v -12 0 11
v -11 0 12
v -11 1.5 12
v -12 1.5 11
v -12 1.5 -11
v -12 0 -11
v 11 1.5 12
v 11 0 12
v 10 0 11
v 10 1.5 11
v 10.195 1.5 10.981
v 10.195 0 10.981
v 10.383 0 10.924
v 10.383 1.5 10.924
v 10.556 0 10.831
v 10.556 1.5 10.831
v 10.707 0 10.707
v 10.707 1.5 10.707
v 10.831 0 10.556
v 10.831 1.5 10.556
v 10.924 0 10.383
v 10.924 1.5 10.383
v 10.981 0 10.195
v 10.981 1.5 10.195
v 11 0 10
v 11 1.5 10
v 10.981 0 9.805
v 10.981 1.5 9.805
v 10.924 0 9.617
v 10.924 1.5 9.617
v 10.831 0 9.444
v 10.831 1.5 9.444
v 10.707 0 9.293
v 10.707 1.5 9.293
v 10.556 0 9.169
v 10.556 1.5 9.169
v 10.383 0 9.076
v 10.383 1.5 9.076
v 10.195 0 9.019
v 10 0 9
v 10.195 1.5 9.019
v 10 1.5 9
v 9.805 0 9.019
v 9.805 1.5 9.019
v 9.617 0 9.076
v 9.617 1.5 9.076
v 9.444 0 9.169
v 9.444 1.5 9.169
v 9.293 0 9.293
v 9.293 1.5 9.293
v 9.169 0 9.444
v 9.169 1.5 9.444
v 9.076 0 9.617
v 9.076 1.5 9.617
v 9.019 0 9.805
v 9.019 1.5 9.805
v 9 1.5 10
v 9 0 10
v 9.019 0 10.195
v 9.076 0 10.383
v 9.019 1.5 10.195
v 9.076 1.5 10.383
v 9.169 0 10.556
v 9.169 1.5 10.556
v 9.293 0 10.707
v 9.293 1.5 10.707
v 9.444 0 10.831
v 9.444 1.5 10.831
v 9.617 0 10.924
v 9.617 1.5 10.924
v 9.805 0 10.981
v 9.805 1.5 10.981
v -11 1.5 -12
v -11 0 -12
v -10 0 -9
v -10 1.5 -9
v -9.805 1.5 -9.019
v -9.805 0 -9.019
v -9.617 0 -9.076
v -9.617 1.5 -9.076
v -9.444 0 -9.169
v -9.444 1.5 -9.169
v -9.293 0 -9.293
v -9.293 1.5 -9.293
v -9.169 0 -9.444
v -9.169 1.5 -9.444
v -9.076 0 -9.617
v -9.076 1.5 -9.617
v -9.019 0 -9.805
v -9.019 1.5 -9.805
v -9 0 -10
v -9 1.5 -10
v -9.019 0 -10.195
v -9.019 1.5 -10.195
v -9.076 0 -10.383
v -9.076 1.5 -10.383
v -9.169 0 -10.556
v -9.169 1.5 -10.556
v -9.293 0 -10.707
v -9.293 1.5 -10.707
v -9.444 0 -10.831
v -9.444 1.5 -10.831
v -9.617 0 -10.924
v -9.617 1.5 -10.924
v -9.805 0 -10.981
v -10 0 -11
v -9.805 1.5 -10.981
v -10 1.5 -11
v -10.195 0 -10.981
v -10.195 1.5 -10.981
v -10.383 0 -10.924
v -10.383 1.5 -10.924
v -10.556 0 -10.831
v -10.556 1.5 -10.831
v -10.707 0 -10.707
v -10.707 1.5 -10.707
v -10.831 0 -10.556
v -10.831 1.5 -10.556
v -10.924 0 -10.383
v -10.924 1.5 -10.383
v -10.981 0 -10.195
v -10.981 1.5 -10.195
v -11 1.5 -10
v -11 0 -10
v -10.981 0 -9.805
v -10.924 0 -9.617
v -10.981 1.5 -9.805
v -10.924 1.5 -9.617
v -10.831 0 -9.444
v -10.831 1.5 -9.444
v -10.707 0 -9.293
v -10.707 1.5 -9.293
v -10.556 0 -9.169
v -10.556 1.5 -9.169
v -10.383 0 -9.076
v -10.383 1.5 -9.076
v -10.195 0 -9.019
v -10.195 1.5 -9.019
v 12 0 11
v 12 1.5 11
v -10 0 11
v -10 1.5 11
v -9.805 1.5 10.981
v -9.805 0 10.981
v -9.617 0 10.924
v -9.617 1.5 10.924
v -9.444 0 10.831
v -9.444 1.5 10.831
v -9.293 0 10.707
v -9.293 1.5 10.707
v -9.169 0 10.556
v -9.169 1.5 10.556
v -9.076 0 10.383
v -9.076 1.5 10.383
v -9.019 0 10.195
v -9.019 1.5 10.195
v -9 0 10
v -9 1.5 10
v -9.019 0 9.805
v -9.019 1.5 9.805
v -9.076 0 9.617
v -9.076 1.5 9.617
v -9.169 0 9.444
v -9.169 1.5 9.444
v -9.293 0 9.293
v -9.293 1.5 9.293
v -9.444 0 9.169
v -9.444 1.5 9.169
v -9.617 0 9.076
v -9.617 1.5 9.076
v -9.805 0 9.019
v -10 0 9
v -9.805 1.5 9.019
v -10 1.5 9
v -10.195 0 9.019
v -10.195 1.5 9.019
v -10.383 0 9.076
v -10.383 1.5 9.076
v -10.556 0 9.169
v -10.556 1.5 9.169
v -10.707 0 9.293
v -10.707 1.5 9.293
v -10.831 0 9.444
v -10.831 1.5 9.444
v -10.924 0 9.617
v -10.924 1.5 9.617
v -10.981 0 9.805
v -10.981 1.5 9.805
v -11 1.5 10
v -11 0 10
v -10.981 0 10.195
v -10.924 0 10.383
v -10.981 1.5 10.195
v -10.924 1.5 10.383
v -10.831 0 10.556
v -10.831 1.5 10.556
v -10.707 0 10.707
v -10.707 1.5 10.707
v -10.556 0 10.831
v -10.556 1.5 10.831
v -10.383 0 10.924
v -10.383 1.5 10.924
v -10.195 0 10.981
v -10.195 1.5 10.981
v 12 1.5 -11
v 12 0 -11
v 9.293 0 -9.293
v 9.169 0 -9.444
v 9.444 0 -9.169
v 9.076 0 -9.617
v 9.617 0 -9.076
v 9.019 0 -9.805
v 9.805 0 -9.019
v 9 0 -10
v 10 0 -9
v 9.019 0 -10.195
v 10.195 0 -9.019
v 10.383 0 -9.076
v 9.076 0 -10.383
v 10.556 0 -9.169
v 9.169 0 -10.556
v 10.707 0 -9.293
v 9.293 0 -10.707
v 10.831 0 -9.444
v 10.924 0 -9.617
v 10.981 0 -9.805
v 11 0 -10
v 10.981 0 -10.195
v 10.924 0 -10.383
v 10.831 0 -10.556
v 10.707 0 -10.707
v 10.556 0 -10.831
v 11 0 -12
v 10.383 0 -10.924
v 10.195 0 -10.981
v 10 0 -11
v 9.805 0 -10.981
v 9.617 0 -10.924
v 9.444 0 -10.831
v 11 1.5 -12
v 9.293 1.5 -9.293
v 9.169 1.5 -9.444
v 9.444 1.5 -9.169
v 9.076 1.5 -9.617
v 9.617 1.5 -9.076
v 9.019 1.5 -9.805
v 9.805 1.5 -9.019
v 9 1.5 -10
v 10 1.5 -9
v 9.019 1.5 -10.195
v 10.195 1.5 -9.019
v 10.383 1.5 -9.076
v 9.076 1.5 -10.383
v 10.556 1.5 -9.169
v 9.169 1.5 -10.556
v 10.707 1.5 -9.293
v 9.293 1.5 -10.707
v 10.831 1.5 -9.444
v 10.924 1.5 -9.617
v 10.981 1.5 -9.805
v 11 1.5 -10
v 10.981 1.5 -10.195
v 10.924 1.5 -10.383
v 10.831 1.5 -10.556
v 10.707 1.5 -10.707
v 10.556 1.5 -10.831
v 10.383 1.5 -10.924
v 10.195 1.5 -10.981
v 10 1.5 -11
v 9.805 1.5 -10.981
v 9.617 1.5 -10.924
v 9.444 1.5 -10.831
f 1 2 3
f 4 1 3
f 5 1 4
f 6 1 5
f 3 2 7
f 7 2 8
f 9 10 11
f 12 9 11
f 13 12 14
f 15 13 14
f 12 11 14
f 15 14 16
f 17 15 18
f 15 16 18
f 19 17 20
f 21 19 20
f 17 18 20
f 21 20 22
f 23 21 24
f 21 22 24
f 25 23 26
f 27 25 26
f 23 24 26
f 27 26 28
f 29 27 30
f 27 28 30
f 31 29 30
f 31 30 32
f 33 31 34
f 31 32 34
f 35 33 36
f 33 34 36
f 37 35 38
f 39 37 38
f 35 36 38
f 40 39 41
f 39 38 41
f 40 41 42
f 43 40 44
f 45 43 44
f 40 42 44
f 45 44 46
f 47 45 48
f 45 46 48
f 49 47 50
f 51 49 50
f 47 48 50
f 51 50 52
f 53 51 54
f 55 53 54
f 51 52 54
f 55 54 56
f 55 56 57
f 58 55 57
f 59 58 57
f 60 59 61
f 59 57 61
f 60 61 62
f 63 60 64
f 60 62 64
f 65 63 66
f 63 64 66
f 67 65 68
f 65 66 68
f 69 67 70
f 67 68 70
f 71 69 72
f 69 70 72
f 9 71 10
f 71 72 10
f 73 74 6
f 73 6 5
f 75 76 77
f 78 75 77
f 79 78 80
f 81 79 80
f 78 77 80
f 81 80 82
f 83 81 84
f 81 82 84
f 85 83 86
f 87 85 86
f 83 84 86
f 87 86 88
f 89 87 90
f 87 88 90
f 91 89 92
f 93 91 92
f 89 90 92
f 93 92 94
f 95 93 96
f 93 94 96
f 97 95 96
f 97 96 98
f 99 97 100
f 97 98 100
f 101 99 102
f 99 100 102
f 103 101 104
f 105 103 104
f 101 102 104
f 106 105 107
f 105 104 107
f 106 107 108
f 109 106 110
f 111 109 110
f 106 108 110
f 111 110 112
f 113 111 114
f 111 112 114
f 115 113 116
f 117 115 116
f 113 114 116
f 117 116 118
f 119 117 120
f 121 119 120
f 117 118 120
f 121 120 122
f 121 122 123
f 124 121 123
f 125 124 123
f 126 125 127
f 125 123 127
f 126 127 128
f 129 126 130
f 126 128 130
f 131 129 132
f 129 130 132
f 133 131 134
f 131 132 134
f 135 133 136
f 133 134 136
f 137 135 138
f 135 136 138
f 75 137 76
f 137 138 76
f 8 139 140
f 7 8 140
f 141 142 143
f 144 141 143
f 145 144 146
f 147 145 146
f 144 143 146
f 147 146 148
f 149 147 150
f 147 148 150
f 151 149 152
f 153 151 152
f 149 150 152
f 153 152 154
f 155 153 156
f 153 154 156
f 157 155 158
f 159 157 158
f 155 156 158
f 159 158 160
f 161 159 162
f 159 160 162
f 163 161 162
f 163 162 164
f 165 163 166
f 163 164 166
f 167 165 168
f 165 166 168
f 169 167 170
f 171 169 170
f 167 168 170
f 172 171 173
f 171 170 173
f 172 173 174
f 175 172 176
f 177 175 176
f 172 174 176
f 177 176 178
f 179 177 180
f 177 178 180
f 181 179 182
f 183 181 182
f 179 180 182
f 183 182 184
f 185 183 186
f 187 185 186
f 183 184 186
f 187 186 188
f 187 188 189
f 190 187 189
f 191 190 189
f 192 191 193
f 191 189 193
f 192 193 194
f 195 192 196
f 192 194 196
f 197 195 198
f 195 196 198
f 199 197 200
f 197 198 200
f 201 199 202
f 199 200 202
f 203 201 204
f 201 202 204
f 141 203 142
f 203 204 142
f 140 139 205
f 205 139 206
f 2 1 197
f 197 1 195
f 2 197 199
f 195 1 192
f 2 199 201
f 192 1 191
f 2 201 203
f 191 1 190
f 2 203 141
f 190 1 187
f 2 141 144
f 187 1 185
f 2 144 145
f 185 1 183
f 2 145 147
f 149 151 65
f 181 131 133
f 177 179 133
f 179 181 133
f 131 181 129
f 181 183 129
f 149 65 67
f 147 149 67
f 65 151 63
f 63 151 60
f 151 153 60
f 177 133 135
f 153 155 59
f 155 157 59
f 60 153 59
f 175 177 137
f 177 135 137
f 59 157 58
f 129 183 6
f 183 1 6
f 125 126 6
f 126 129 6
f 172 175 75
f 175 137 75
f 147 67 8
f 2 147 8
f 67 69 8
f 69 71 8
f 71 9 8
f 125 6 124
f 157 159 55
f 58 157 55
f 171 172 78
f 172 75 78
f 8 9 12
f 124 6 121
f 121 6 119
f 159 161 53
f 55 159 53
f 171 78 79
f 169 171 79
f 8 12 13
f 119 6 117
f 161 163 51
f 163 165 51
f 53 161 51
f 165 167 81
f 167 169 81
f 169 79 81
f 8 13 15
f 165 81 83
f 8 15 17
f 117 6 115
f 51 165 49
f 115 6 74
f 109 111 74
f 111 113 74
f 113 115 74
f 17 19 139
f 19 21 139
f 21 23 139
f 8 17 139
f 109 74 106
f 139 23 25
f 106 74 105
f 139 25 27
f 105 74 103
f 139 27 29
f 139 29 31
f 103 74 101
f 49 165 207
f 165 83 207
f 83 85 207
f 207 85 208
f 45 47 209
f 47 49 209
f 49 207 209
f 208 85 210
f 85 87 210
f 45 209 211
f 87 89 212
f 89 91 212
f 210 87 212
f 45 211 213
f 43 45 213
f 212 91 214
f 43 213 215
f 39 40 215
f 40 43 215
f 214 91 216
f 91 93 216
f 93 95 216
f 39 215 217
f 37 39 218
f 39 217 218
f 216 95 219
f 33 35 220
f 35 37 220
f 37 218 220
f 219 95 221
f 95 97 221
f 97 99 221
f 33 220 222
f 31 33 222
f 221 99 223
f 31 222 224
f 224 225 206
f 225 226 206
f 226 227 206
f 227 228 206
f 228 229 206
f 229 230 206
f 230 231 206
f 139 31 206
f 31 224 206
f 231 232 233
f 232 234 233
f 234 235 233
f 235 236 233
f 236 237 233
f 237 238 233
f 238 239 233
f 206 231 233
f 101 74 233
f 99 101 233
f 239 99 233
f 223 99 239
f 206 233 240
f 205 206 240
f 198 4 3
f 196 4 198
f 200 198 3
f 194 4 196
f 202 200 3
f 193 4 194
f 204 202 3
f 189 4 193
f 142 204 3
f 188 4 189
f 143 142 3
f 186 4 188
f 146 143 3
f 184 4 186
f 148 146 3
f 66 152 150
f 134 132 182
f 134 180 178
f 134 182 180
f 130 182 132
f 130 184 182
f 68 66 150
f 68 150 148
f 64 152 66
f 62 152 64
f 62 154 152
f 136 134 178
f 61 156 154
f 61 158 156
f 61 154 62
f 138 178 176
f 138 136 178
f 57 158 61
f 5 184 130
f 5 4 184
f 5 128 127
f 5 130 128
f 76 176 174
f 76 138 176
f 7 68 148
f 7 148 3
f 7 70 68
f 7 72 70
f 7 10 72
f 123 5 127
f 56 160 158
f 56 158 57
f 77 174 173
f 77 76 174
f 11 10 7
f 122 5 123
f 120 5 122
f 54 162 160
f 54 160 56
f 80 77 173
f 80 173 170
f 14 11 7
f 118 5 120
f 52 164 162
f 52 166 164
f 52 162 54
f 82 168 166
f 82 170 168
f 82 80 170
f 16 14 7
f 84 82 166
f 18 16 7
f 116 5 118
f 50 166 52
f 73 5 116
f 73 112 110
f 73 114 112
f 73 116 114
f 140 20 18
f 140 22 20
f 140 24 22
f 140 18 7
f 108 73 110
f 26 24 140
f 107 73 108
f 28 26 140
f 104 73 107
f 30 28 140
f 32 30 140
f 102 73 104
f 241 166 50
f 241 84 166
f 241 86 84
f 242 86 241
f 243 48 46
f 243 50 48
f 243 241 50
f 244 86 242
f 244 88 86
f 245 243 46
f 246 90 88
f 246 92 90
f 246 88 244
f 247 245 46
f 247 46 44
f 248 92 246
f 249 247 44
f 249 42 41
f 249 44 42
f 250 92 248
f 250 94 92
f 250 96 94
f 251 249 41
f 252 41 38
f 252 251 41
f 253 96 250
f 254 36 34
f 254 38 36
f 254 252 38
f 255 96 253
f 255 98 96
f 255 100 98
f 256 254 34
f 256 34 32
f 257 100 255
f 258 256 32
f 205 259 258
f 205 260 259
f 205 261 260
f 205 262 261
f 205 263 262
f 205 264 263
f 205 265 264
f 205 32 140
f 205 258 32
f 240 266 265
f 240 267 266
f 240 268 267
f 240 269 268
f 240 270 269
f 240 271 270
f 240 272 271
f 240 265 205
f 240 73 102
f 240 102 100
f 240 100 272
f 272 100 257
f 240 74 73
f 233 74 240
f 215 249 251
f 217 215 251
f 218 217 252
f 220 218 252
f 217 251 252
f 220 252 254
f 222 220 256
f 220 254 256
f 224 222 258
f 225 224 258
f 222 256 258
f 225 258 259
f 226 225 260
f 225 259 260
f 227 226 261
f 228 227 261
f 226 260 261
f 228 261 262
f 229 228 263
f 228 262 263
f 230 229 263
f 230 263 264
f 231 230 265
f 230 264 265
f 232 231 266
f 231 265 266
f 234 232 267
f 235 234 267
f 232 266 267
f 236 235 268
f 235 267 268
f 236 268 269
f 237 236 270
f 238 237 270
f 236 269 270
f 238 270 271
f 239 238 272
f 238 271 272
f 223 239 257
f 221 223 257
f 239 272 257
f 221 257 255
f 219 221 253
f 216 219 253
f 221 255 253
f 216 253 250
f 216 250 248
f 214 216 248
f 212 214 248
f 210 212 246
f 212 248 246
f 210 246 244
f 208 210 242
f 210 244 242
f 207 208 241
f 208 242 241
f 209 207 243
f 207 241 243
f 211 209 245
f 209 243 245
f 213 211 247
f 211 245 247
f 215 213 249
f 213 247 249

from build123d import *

# Parameters (mm, degrees)
SKETCH1_W           = 24
SKETCH1_H           = 24
BOSS_EXTRUDE1_DEPTH = 1.5
CHAMFER1_SIZE       = 1
SKETCH2_R           = 1
CUT_EXTRUDE1_DEPTH  = 1.5


with BuildPart() as part:
    # Sketch1 → Boss-Extrude1 (new body)
    with BuildSketch(Plane(origin=(0, 0, 0), x_dir=(1, 0, 0), z_dir=(0, 1, 0))):
        Rectangle(SKETCH1_W, SKETCH1_H)
    extrude(amount=BOSS_EXTRUDE1_DEPTH)

    # Chamfer1
    chamfer1_edges = [part.edges().sort_by_distance(p)[0] for p in [
        (-12, 0.75, -12),
        (12, 0.75, -12),
        (12, 0.75, 12),
        (-12, 0.75, 12),
    ]]
    chamfer(chamfer1_edges, length=CHAMFER1_SIZE)

    # Sketch2 → Cut-Extrude1 (cut)
    with BuildSketch(Plane(origin=(0, 1.5, 0), x_dir=(1, 0, 0), z_dir=(0, 1, 0))):
        with Locations(Location((-10, 10, 0), (0, 0, 270))):
            Circle(SKETCH2_R)
        with Locations(Location((10, 10, 0), (0, 0, 270))):
            Circle(SKETCH2_R)
        with Locations(Location((10, -10, 0), (0, 0, 270))):
            Circle(SKETCH2_R)
        with Locations(Location((-10, -10, 0), (0, 0, 270))):
            Circle(SKETCH2_R)
    extrude(amount=-CUT_EXTRUDE1_DEPTH, mode=Mode.SUBTRACT)


solid = part.part
